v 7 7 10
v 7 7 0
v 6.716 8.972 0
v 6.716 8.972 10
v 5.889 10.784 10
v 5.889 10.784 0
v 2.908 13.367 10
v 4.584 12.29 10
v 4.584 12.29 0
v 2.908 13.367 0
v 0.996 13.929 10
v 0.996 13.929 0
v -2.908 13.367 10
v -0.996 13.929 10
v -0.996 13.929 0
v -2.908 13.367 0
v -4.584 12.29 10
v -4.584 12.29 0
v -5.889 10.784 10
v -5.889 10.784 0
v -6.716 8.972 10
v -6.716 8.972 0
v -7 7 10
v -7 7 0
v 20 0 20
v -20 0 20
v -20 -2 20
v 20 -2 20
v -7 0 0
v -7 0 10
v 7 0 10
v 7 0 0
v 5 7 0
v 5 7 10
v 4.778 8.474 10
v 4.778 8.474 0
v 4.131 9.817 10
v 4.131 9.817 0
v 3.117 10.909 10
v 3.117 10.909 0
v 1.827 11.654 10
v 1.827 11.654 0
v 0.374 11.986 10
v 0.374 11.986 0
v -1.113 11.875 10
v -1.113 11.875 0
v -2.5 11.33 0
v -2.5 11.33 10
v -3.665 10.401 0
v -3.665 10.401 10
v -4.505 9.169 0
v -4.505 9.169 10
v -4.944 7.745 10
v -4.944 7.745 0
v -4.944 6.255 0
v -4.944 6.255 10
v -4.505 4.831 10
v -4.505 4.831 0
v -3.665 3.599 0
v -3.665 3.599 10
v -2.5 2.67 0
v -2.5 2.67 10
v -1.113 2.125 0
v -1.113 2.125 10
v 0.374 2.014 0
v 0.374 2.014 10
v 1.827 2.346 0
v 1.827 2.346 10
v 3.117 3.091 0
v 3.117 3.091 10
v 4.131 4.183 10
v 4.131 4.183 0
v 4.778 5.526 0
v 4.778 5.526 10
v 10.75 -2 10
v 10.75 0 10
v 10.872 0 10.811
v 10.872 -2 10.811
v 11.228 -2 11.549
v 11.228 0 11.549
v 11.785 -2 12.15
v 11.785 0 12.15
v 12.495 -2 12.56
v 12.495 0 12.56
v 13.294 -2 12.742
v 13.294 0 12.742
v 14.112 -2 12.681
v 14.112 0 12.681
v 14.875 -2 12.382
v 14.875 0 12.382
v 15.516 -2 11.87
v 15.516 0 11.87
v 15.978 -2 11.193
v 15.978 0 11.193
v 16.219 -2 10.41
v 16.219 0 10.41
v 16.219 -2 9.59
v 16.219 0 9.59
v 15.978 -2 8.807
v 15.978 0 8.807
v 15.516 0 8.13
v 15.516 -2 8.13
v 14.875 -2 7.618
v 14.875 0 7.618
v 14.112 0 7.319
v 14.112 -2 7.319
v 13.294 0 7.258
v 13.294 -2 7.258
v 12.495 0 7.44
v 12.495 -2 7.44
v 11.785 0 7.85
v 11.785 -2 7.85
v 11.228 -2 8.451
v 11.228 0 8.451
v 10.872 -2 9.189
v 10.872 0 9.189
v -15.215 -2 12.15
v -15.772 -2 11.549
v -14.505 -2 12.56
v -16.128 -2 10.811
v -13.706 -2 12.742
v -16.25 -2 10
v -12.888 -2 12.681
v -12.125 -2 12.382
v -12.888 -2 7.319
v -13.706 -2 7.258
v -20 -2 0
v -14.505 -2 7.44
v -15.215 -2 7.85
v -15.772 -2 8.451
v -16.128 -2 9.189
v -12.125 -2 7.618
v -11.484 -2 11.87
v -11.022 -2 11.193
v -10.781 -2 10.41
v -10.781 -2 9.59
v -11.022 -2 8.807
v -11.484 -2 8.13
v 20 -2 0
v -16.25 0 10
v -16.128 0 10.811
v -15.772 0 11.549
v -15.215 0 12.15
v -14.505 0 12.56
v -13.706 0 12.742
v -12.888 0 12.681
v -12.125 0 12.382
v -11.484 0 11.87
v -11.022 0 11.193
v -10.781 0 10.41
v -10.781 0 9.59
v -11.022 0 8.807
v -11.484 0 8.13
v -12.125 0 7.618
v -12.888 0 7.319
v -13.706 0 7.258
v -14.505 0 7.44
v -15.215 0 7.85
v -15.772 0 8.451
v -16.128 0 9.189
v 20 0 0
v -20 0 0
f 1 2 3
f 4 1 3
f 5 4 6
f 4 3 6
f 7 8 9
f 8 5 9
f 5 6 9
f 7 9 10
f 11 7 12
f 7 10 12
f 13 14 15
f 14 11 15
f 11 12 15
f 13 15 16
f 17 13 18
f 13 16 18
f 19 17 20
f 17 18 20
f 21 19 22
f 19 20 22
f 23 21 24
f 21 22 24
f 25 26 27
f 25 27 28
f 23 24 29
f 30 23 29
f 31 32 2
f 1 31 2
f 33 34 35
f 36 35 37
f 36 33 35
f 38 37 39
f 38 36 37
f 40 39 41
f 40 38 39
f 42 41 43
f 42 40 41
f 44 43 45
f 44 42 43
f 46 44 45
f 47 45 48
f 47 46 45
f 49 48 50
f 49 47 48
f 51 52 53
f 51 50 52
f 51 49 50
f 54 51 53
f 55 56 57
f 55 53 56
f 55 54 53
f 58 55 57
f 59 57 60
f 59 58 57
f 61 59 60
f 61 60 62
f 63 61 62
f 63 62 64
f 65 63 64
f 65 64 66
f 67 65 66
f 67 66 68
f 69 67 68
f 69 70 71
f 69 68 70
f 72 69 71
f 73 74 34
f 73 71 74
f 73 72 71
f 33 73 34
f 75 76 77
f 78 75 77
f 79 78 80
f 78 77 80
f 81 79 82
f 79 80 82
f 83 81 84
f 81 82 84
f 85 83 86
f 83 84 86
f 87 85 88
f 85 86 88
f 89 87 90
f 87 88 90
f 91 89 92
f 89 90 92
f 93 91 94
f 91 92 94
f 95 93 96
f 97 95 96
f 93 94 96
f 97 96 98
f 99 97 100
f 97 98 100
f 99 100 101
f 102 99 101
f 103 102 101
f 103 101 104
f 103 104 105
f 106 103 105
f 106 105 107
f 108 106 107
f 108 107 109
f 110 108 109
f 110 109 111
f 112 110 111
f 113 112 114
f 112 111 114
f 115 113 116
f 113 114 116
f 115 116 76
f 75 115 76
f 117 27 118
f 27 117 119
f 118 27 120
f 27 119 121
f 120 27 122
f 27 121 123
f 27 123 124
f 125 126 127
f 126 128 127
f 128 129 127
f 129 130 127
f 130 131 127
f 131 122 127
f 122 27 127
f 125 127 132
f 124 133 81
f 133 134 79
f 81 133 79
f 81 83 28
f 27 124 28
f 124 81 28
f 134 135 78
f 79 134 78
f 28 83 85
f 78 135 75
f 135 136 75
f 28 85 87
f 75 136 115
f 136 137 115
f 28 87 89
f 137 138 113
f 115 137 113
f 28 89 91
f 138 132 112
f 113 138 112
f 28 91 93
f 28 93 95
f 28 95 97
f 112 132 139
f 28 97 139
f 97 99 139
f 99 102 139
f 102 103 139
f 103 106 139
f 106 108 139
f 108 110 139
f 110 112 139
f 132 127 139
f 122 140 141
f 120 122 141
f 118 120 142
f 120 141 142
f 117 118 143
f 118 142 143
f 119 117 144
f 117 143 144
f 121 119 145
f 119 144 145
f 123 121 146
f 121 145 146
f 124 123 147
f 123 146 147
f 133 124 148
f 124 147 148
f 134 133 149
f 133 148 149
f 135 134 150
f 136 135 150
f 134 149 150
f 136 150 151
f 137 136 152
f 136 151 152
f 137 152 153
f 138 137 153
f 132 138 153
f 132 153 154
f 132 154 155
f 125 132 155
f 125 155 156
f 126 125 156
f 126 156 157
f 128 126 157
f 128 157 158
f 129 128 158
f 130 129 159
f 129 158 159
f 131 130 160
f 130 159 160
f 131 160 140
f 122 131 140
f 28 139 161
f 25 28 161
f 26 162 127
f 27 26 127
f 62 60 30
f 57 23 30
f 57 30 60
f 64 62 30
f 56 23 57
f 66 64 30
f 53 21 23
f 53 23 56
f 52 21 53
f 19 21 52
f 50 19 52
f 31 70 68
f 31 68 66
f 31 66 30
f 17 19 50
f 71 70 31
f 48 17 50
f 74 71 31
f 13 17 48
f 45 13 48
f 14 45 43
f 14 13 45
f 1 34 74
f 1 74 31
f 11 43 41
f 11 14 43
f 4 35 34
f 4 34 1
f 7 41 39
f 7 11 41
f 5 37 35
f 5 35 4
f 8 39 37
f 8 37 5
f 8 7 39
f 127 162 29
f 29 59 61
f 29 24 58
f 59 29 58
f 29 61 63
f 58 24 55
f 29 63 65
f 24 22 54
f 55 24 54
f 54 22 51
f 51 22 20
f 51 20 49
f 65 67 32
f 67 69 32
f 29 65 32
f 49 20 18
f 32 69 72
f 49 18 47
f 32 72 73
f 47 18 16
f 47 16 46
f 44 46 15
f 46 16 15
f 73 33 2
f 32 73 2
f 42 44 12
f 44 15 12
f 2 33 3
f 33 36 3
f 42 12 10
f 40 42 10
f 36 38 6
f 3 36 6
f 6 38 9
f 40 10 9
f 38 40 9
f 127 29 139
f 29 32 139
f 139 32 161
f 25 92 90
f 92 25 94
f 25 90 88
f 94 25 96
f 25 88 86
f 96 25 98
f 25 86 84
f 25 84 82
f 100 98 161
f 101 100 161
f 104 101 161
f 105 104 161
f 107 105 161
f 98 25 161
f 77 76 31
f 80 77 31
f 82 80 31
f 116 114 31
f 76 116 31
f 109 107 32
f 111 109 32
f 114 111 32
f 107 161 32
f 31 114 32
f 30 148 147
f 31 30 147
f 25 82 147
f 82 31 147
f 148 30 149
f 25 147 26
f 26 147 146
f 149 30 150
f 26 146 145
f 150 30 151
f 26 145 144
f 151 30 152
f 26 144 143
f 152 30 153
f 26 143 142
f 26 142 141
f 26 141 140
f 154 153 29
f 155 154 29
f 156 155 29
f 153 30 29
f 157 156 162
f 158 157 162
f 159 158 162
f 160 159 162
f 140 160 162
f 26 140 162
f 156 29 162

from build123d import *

# Parameters (mm, degrees)
F0_R     = 5
F1_DEPTH = 20
F2_R     = 2.75
F3_DEPTH = 2
F5_DEPTH = 10


with BuildPart() as f1:
    # F0 (on Top) → F1 (new body)
    with BuildSketch(Plane.XY):
        Polygon((-20, -2), (20, -2), (20, 0), (7, 0), (0, 0), (-7, 0), (-20, 0), align=None)
        with BuildLine():
            Line((0, 0), (7, 0))
            Line((7, 0), (7, 7))
            ThreePointArc((7, 7), (4.949747, 2.050253), (0, 0))
        make_face()
        with BuildLine():
            Line((-7, 7), (-7, 0))
            Line((-7, 0), (0, 0))
            ThreePointArc((0, 0), (-4.949747, 2.050253), (-7, 7))
        make_face()
        with BuildLine():
            ThreePointArc((-7, 7), (-4.949747, 2.050253), (0, 0))
            ThreePointArc((0, 0), (4.949747, 2.050253), (7, 7))
            ThreePointArc((7, 7), (0, 14), (-7, 7))
        make_face()
        with Locations((0, 7)):
            Circle(F0_R, mode=Mode.SUBTRACT)
    extrude(amount=F1_DEPTH)

    # F2 (on face) → F3 (cut, through all)
    with BuildSketch(Plane(origin=(0, 0, 0), x_dir=(-1, 0, 0), z_dir=(0, 1, 0))):
        with Locations((-13.5, 10)):
            Circle(F2_R)
        with Locations((13.5, 10)):
            Circle(F2_R)
    extrude(amount=-F3_DEPTH, mode=Mode.SUBTRACT)

    # F4 (on face) → F5 (cut)
    with BuildSketch(Plane.XY.offset(20)):
        with BuildLine():
            Line((-7, 7), (-7, 0))
            Line((-7, 0), (7, 0))
            Line((7, 0), (7, 7))
            ThreePointArc((7, 7), (4.949747, 11.949747), (0, 14))
            ThreePointArc((0, 14), (-4.949747, 11.949747), (-7, 7))
        make_face()
        with BuildLine():
            Line((-7, 14), (-7, 7))
            ThreePointArc((-7, 7), (-4.949747, 11.949747), (0, 14))
            Line((0, 14), (-7, 14))
        make_face()
        with BuildLine():
            ThreePointArc((0, 14), (4.949747, 11.949747), (7, 7))
            Line((7, 7), (7, 14))
            Line((7, 14), (0, 14))
        make_face()
    extrude(amount=-F5_DEPTH, mode=Mode.SUBTRACT)


solid = f1.part
